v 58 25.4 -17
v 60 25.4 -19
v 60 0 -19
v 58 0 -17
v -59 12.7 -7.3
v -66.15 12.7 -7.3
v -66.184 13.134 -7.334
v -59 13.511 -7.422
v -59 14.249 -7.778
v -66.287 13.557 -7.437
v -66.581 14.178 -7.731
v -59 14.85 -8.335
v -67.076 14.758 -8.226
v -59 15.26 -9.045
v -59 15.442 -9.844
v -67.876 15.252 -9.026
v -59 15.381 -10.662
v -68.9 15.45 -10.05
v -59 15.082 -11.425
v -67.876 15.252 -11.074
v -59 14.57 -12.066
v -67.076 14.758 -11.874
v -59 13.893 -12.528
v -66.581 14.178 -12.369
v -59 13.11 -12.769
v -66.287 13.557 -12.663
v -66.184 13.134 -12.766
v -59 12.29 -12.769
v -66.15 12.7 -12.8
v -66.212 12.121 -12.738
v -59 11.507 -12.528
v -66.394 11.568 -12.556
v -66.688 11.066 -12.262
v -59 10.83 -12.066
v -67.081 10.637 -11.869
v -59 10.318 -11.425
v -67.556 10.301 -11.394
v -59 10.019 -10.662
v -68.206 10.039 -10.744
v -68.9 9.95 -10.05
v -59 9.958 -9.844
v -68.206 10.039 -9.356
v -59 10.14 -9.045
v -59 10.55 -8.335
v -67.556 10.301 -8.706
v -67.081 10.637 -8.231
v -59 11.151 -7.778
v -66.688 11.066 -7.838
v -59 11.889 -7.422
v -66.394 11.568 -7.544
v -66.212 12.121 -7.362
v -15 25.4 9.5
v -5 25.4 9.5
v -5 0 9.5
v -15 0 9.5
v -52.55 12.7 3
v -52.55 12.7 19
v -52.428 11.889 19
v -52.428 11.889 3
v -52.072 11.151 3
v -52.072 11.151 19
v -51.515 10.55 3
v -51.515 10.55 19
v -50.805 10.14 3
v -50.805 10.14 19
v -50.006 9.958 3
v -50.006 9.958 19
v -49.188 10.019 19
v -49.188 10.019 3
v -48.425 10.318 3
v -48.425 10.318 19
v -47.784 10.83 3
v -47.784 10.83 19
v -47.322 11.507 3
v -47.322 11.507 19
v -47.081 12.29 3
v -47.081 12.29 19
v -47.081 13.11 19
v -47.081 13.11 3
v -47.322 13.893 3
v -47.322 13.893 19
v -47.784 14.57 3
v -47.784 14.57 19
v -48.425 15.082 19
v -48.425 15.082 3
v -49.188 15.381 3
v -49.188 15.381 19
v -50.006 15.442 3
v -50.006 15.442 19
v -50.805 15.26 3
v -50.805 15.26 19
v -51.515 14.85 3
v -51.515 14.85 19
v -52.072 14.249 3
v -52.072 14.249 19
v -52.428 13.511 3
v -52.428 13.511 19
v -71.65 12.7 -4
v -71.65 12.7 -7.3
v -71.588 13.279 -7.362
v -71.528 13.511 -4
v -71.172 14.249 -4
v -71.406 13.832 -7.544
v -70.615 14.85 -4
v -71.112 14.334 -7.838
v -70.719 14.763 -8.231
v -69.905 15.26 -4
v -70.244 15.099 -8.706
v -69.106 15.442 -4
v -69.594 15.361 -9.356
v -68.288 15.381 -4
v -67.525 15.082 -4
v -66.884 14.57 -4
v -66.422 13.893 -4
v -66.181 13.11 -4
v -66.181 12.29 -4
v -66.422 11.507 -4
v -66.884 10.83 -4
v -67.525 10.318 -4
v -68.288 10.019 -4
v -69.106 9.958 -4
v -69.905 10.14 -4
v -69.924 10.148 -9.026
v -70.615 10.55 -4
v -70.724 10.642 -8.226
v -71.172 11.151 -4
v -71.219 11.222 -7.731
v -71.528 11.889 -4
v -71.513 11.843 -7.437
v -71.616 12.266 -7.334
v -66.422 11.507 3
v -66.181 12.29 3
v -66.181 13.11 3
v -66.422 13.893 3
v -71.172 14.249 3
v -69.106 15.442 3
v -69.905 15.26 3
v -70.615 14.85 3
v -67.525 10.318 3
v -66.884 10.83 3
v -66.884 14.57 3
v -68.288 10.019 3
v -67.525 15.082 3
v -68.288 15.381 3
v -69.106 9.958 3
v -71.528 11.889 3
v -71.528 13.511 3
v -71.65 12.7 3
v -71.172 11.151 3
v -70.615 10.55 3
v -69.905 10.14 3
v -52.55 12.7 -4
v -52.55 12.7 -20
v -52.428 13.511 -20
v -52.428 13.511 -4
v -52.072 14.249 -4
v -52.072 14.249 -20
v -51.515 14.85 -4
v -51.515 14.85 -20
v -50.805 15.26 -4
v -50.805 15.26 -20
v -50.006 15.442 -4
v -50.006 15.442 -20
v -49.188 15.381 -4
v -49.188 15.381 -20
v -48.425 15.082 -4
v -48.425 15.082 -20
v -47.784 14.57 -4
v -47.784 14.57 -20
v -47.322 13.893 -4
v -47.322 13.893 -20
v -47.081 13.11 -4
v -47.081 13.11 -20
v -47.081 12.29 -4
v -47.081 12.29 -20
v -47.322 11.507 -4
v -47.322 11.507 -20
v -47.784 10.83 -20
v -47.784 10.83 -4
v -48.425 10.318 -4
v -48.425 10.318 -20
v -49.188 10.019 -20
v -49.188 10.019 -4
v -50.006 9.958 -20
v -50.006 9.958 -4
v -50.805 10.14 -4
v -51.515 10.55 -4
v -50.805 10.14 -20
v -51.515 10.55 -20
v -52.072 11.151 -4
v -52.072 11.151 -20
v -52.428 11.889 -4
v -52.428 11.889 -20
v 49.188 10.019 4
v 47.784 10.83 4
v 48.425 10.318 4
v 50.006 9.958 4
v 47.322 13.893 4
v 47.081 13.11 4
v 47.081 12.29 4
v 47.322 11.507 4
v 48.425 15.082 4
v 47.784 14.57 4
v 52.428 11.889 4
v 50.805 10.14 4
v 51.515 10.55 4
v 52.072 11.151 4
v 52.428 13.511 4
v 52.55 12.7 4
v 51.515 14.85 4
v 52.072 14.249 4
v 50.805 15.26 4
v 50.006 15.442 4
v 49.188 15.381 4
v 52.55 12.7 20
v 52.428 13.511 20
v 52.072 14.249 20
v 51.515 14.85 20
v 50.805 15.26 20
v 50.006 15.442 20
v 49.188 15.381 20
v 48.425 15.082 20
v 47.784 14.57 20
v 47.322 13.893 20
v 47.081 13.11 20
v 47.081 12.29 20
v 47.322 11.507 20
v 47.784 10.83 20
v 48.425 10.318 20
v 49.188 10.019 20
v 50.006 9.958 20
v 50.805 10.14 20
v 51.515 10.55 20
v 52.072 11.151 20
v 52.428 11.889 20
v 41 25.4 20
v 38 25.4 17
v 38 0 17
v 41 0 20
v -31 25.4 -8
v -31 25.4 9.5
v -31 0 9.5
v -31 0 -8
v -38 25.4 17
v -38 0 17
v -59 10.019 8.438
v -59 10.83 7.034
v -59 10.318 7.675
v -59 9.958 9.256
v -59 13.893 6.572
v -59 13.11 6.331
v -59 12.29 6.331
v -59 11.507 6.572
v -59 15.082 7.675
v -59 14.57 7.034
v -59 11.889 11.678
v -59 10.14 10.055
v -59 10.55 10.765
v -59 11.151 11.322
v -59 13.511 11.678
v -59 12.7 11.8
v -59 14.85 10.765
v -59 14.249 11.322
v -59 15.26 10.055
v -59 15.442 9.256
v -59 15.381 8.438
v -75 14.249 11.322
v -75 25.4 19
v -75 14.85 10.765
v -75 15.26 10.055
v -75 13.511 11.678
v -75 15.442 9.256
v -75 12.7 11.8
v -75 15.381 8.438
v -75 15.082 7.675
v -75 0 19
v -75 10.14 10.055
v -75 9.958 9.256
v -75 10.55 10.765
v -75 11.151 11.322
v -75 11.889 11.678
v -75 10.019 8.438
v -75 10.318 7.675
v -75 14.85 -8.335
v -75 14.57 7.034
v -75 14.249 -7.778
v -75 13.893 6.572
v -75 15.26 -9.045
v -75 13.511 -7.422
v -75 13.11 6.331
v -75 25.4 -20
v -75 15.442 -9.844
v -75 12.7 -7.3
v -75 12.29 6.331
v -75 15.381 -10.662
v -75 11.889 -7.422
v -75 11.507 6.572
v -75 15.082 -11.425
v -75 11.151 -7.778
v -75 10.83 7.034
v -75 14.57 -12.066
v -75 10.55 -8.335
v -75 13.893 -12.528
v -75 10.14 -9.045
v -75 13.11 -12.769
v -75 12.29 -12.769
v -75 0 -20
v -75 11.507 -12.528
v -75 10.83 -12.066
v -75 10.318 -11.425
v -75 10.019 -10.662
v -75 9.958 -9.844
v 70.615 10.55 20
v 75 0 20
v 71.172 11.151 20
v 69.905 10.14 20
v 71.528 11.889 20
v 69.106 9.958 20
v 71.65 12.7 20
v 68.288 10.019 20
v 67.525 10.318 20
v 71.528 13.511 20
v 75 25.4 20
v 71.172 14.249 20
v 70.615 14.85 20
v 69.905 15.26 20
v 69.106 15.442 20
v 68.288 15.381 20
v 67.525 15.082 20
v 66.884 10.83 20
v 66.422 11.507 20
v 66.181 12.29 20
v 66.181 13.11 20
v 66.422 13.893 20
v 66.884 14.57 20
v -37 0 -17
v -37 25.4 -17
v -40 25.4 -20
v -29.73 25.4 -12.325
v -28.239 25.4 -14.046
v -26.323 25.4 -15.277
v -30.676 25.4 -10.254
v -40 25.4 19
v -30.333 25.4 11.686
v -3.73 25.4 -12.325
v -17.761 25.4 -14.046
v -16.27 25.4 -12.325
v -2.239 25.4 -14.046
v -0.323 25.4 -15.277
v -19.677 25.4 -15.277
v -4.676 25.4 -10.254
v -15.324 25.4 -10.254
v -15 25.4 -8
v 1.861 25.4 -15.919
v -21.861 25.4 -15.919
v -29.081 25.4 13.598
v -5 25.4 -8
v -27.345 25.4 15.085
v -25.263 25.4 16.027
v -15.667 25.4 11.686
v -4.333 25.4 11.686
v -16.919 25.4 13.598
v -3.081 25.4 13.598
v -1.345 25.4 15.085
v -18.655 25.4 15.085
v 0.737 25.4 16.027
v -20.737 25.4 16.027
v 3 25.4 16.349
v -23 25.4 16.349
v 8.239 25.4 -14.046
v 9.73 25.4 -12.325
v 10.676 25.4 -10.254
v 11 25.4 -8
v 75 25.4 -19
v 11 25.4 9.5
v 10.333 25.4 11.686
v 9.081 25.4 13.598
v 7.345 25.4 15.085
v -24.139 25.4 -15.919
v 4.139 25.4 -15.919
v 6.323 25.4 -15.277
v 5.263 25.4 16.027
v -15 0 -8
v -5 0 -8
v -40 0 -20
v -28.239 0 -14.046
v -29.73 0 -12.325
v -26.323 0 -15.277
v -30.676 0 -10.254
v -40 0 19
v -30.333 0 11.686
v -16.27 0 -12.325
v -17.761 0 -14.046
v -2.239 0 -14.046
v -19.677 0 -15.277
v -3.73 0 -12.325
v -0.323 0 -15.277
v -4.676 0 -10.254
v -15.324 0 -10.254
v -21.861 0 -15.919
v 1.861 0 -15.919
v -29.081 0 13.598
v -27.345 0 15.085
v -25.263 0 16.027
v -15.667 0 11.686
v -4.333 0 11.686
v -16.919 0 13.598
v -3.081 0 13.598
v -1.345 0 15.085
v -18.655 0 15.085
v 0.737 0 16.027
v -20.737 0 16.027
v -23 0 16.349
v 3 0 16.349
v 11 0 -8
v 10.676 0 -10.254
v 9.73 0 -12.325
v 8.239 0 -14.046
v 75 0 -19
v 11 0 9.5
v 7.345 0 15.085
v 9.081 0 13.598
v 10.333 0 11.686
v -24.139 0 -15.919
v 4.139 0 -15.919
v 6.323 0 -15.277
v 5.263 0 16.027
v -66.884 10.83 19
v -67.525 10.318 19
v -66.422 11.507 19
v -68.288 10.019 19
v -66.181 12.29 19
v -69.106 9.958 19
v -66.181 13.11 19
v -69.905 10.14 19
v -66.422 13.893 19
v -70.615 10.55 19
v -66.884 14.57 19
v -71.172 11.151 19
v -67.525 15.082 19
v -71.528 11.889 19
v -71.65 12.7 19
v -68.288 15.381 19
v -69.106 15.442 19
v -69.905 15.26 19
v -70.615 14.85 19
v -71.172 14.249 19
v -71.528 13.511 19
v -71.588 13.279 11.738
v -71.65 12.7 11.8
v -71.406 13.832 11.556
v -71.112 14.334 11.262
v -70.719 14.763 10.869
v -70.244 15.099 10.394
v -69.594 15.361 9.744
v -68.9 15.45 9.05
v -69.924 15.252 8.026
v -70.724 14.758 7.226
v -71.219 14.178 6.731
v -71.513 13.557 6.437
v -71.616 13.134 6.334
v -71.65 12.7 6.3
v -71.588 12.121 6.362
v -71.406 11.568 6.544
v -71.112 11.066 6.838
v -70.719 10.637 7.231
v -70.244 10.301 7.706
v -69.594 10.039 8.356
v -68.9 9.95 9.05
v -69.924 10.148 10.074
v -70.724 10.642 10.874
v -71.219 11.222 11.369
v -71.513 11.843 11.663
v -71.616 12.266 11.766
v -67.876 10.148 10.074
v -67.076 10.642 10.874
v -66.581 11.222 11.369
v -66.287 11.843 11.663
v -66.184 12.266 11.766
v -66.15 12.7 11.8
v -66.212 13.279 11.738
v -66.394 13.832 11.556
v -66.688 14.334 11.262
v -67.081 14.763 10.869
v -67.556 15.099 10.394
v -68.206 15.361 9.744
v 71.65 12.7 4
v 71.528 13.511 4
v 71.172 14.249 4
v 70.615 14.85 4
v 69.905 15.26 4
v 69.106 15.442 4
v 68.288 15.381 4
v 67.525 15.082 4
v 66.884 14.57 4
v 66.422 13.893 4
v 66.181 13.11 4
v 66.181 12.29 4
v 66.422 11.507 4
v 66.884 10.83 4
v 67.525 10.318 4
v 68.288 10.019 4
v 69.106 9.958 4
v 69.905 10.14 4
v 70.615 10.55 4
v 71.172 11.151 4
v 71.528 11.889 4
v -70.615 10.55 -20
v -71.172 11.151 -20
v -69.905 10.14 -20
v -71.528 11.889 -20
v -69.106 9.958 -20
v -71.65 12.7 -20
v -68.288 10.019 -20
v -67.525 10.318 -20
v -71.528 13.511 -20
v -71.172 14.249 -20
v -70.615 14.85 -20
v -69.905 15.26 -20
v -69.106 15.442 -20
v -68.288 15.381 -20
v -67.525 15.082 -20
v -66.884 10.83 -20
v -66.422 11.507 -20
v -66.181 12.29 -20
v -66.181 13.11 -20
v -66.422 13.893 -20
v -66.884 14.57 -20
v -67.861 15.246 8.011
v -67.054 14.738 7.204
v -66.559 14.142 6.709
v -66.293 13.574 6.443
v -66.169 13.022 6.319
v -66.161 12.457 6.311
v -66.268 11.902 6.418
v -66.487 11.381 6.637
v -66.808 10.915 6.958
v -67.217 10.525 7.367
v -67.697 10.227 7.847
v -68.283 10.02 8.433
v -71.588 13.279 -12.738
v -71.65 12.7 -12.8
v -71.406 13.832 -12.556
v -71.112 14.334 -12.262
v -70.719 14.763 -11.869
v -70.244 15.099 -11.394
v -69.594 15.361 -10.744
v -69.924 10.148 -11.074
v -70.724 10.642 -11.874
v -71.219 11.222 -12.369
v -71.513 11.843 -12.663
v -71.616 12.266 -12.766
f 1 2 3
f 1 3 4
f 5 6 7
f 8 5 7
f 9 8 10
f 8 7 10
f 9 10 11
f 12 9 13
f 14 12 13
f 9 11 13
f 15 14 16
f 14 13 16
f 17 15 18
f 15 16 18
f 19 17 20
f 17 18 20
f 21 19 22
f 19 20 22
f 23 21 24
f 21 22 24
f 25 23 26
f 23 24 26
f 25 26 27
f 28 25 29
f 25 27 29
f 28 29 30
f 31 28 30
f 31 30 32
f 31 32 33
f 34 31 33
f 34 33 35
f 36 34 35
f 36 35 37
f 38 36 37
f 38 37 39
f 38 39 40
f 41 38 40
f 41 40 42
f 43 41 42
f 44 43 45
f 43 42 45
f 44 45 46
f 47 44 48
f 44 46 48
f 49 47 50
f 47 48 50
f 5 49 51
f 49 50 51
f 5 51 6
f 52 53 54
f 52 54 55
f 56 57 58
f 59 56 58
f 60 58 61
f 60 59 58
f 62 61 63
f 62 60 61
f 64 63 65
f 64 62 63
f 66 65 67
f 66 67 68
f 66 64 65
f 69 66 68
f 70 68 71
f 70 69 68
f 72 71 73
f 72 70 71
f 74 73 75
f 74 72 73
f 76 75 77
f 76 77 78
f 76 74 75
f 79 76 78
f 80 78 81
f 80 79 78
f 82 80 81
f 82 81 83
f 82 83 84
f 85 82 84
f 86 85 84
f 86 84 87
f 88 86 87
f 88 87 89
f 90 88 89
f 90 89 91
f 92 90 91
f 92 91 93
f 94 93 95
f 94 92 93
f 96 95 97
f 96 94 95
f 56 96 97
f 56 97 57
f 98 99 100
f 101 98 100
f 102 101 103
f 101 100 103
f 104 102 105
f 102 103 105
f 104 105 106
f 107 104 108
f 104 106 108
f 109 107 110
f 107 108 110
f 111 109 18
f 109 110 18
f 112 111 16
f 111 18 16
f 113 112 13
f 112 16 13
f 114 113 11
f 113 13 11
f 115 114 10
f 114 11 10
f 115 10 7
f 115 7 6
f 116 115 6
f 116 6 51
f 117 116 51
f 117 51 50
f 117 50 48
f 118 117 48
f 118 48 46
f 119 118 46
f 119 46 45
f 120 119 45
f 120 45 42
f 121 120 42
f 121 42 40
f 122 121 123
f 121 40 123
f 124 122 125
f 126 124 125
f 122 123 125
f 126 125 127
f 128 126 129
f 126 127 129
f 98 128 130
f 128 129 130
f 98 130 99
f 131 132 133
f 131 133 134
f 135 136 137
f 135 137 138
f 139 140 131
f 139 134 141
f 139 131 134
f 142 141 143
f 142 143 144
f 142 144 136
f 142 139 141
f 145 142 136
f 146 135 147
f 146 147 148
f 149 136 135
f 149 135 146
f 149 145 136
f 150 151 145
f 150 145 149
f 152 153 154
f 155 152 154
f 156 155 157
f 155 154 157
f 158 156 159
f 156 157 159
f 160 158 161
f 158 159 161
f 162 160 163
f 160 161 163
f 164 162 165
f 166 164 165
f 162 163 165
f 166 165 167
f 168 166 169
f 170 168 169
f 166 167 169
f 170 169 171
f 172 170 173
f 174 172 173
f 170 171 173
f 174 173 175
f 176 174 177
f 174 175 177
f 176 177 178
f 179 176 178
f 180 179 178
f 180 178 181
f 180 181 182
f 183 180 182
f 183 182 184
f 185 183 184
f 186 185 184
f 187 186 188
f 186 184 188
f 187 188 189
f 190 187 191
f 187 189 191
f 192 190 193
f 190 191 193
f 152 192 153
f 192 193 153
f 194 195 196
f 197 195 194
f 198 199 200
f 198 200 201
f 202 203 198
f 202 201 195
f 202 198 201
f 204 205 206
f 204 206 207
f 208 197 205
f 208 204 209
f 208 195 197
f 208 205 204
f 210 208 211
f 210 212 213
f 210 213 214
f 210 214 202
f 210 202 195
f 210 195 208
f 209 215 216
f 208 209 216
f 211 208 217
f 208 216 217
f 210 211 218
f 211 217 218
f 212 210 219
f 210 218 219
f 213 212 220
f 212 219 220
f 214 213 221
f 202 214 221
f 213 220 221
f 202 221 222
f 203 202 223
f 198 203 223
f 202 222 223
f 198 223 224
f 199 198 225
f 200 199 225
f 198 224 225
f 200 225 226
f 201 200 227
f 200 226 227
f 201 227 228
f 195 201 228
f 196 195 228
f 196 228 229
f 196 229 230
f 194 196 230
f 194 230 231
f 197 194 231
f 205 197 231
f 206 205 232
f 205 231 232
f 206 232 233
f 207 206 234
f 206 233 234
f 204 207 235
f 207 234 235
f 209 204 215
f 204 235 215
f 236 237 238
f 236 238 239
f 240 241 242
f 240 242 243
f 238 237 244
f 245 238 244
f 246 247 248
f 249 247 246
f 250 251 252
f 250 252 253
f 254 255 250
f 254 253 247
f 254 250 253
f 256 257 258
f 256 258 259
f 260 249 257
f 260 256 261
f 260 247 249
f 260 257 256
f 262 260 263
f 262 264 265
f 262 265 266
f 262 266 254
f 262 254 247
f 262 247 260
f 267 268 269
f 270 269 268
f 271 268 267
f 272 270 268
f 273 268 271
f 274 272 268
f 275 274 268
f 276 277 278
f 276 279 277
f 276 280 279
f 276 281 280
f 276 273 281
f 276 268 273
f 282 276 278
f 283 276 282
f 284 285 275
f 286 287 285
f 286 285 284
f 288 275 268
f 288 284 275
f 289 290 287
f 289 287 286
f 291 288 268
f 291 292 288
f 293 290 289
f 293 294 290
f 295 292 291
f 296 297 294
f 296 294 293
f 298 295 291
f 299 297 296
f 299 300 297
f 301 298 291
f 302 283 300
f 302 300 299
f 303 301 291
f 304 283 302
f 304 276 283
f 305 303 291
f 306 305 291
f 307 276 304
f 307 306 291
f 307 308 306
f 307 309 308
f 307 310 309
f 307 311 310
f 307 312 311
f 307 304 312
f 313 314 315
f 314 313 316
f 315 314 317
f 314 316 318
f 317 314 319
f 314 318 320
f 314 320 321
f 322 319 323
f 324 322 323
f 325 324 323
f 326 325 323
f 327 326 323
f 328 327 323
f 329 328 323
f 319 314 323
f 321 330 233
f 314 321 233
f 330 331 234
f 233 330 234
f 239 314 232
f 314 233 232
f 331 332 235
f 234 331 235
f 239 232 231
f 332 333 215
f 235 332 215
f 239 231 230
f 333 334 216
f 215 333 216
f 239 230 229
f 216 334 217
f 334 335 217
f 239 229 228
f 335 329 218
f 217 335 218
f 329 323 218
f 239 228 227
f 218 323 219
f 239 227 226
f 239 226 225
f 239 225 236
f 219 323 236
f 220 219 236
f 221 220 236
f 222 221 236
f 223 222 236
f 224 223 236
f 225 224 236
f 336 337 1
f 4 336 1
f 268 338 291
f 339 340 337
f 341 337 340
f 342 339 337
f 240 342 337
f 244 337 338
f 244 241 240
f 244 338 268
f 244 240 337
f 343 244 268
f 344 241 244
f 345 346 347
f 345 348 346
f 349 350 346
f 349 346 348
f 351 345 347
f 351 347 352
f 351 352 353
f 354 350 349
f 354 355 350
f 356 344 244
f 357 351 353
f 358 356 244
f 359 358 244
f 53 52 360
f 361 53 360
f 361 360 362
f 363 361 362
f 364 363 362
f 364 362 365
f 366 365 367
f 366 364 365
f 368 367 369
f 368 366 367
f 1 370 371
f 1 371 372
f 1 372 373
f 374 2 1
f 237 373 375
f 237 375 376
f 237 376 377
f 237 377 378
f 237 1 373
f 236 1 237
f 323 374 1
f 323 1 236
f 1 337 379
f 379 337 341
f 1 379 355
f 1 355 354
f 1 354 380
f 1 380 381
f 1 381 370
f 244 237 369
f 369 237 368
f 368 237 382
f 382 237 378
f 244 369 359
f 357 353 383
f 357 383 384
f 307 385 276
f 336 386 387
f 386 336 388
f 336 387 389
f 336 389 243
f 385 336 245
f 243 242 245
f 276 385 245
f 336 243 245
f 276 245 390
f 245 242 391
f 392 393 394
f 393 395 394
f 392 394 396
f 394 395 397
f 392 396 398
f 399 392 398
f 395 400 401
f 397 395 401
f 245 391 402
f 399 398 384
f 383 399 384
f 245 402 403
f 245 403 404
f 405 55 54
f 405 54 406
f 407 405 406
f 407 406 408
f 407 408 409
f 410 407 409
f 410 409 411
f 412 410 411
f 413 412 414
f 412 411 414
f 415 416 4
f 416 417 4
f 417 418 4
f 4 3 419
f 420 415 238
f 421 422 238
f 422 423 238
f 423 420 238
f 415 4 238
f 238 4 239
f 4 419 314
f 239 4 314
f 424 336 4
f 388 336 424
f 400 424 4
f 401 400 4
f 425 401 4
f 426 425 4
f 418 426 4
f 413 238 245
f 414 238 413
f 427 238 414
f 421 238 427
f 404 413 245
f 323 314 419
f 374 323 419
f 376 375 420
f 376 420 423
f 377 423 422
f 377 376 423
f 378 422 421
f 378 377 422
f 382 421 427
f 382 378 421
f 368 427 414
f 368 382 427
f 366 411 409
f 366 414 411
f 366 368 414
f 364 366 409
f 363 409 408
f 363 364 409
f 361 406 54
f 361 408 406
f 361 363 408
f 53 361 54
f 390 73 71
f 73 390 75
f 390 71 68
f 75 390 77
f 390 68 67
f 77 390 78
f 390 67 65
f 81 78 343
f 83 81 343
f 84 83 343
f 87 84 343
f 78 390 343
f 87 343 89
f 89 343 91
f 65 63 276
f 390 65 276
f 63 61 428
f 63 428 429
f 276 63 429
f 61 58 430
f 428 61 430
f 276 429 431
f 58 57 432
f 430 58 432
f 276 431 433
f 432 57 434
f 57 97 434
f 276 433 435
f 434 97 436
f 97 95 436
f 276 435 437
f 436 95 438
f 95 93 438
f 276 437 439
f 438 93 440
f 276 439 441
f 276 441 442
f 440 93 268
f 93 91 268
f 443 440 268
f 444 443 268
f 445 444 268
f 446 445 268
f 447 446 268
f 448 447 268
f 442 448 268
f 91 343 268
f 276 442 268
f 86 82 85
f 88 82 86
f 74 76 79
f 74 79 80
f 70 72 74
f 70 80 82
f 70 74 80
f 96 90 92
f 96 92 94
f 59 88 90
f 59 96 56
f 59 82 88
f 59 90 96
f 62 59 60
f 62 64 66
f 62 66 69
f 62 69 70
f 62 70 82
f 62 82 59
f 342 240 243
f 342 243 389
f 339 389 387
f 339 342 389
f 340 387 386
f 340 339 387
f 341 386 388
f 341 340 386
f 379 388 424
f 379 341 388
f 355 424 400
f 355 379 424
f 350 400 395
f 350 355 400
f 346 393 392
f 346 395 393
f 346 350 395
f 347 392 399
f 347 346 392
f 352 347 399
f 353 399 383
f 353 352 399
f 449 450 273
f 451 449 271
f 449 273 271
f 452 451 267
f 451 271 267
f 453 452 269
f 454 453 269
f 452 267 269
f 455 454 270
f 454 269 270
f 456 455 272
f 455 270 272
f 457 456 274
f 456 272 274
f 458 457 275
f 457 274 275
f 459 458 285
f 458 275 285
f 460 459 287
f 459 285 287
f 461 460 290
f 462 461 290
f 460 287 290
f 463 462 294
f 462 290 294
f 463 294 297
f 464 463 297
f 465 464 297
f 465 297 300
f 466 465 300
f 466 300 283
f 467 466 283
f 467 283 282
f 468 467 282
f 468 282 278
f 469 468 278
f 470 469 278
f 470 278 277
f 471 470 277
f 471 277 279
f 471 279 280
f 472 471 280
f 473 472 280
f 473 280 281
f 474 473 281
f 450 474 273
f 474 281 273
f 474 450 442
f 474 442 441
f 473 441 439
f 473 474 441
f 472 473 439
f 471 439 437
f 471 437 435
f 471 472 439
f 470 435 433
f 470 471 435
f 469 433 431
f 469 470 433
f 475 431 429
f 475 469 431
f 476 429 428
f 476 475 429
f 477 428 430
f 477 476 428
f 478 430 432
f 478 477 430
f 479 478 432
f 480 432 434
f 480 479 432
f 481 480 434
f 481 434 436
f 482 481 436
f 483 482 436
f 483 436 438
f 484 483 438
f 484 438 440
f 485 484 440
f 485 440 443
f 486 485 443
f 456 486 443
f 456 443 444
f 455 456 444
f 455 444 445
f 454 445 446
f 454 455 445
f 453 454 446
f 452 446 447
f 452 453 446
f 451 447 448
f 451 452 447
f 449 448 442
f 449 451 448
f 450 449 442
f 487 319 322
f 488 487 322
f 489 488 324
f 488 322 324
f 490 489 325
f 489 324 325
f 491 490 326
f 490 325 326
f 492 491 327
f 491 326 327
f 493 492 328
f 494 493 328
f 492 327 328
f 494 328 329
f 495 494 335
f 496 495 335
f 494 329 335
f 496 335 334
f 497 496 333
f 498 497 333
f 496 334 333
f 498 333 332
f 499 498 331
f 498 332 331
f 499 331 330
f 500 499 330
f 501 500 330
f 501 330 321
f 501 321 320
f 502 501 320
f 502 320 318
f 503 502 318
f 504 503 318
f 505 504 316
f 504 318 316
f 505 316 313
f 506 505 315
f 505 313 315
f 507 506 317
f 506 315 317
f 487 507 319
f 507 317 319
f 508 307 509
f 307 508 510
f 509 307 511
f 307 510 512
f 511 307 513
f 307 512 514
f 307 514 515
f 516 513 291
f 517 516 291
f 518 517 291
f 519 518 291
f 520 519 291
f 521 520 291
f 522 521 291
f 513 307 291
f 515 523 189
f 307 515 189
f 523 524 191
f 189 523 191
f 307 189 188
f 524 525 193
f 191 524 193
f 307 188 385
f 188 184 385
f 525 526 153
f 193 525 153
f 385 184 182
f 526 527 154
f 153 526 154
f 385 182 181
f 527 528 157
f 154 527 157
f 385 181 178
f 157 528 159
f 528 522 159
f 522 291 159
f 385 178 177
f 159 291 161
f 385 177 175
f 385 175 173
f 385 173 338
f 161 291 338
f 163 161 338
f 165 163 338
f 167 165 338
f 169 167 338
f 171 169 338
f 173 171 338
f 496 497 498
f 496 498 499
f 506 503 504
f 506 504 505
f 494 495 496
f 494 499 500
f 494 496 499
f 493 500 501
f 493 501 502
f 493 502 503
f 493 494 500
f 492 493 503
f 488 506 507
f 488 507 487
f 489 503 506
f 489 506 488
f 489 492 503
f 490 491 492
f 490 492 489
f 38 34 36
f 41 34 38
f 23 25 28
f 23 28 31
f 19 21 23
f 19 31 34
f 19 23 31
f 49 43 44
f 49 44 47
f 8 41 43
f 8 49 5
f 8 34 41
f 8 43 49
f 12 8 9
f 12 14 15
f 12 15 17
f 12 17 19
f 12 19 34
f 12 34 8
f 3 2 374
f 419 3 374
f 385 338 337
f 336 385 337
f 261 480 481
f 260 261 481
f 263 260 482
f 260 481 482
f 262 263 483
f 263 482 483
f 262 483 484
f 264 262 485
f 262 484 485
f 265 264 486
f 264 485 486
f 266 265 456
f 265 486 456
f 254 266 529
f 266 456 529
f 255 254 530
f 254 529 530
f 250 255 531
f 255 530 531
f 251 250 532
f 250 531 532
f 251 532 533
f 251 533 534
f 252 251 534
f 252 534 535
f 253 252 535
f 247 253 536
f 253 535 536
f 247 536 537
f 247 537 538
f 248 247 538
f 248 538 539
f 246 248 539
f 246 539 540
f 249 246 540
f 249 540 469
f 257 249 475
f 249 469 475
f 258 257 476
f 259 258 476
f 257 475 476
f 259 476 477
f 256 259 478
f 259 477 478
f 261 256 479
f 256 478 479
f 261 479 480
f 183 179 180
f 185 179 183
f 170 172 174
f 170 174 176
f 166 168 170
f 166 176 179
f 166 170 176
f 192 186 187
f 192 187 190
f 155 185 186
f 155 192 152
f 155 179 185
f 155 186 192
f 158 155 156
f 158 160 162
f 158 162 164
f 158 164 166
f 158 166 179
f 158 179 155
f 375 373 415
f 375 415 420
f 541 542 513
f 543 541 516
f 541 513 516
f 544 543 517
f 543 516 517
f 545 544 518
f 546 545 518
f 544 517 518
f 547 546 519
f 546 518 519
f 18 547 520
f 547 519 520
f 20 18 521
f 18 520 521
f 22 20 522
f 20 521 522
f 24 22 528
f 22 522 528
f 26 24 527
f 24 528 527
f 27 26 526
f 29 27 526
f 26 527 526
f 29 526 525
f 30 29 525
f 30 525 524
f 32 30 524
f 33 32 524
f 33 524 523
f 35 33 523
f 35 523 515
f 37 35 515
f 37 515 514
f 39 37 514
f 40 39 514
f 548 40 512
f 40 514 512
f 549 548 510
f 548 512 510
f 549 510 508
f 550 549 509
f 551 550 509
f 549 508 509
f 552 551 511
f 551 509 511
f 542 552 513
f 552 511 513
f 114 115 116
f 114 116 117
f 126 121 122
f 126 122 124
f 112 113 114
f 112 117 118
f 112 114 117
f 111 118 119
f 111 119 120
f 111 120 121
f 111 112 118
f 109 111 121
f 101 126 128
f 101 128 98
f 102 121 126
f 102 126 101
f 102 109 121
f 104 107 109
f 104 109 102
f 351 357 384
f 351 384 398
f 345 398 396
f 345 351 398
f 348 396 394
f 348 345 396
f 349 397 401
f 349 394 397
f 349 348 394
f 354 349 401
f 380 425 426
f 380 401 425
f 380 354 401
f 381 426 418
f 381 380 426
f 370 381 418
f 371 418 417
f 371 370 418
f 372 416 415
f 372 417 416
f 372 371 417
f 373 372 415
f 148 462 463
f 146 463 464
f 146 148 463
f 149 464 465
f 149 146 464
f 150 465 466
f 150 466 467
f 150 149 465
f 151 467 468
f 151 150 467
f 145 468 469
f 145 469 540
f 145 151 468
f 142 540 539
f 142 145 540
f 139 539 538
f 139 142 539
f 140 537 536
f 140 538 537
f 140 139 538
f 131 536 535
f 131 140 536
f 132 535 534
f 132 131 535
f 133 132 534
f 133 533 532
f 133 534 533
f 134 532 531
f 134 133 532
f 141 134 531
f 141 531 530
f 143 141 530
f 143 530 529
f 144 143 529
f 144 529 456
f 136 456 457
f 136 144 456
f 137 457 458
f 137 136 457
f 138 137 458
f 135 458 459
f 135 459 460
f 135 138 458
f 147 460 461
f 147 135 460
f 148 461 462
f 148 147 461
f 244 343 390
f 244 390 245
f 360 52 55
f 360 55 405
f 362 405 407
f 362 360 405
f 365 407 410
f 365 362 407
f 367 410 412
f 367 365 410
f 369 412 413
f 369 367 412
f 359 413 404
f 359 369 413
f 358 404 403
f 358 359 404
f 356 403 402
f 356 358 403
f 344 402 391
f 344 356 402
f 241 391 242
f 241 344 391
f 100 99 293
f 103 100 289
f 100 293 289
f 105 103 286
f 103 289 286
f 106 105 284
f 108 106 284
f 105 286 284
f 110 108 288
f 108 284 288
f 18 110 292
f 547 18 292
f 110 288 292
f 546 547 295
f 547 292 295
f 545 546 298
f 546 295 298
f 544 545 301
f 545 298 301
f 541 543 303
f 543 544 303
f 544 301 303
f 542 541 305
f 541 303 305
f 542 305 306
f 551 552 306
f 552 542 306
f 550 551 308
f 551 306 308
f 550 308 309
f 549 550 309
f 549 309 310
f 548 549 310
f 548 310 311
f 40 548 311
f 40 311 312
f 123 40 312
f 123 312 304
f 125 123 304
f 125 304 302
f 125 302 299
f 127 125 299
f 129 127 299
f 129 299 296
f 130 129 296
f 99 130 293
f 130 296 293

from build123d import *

# Parameters (mm, degrees)
CROQUIS1_W              = 150
CROQUIS1_H              = 40
SALIENTE_EXTRUIR1_DEPTH = 25.4
CORTAR_EXTRUIR1_DEPTH   = 82.671047502
CHAFL_N1_SIZE           = 5
CHAFL_N2_SIZE           = 3
CORTAR_EXTRUIR2_DEPTH   = 82.671047502
CROQUIS5_R              = 2.75
CORTAR_EXTRUIR3_DEPTH   = 16
CROQUIS6_R              = 2.75
CORTAR_EXTRUIR4_DEPTH   = 16
CORTAR_EXTRUIR8_START   = -16
CROQUIS7_R              = 2.75
CORTAR_EXTRUIR8_DEPTH   = 16
CROQUIS8_R              = 2.75
CORTAR_EXTRUIR9_DEPTH   = 16


with BuildPart() as part:
    # Croquis1 → Saliente-Extruir1 (new body)
    with BuildSketch(Plane(origin=(0, 0, 0), x_dir=(1, 0, 0), z_dir=(0, 1, 0))):
        Rectangle(CROQUIS1_W, CROQUIS1_H)
    extrude(amount=SALIENTE_EXTRUIR1_DEPTH)

    # Croquis2 → Cortar-Extruir1 (cut, through all)
    with BuildSketch(Plane(origin=(0, 25.4, 0), x_dir=(1, 0, 0), z_dir=(0, 1, 0))):
        Polygon((-42, 20), (-42, 17), (61, 17), (61, 19), (75, 19), (75, 20), (60, 20), align=None)
        Polygon((43, -20), (43, -17), (-41, -17), (-41, -19), (-75, -19), (-75, -20), align=None)
    extrude(amount=-CORTAR_EXTRUIR1_DEPTH, mode=Mode.SUBTRACT)

    # Chaflán1
    # the kernel refuses this chamfer: 5 mm, written as the material it adds along each edge
    with BuildSketch(Plane(origin=(43, 25.4, 17), x_dir=(-0.9996219169112968, 0, -0.027495876610586317), z_dir=(0, -1, 0))) as chafl_n1_piece_1_section:
        Polygon((CHAFL_N1_SIZE * 0.999621916911, -CHAFL_N1_SIZE * 0.0274958766106), (-CHAFL_N1_SIZE * 0.0274958766106, -CHAFL_N1_SIZE * 0.999621916911), (0, 0), align=None)
    chafl_n1_piece_1 = extrude(amount=25.4, mode=Mode.PRIVATE)
    chafl_n1_piece_1 = split(chafl_n1_piece_1, bisect_by=Plane(origin=(41.124952702, 12.7, 20), z_dir=(0, 0, -1)), keep=Keep.TOP, mode=Mode.PRIVATE)
    add(chafl_n1_piece_1)
    with BuildSketch(Plane(origin=(-42, 25.4, -17), x_dir=(-0.027495876610586317, 0, -0.9996219169112968), z_dir=(0, -1, 0))) as chafl_n1_piece_2_section:
        Polygon((CHAFL_N1_SIZE * 0.999621916911, CHAFL_N1_SIZE * 0.0274958766106), (-CHAFL_N1_SIZE * 0.0274958766106, CHAFL_N1_SIZE * 0.999621916911), (0, 0), align=None)
    chafl_n1_piece_2 = extrude(amount=25.4, mode=Mode.PRIVATE)
    chafl_n1_piece_2 = split(chafl_n1_piece_2, bisect_by=Plane(origin=(-40.124952702, 12.7, -20), z_dir=(0, 0, 1)), keep=Keep.TOP, mode=Mode.PRIVATE)
    add(chafl_n1_piece_2)

    # Chaflán2
    # the kernel refuses this chamfer: 3 mm, written as the material it adds along each edge
    with BuildSketch(Plane(origin=(-41, 25.4, 17), x_dir=(-0.027495876610586768, 0, 0.9996219169112968), z_dir=(0, -1, 0))) as chafl_n2_piece_1_section:
        Polygon((CHAFL_N2_SIZE * 0.999621916911, -CHAFL_N2_SIZE * 0.0274958766106), (-CHAFL_N2_SIZE * 0.0274958766106, -CHAFL_N2_SIZE * 0.999621916911), (0, 0), align=None)
    chafl_n2_piece_1 = extrude(amount=25.4, mode=Mode.PRIVATE)
    chafl_n2_piece_1 = split(chafl_n2_piece_1, bisect_by=Plane(origin=(-39.907908995, 12.7, 19), z_dir=(0, 0, -1)), keep=Keep.TOP, mode=Mode.PRIVATE)
    add(chafl_n2_piece_1)
    with BuildSketch(Plane(origin=(61, 25.4, -17), x_dir=(0.027495876610586768, 0, -0.9996219169112968), z_dir=(0, -1, 0))) as chafl_n2_piece_2_section:
        Polygon((CHAFL_N2_SIZE * 0.999621916911, -CHAFL_N2_SIZE * 0.0274958766106), (-CHAFL_N2_SIZE * 0.0274958766106, -CHAFL_N2_SIZE * 0.999621916911), (0, 0), align=None)
    chafl_n2_piece_2 = extrude(amount=25.4, mode=Mode.PRIVATE)
    chafl_n2_piece_2 = split(chafl_n2_piece_2, bisect_by=Plane(origin=(59.907908995, 12.7, -19), z_dir=(0, 0, 1)), keep=Keep.TOP, mode=Mode.PRIVATE)
    add(chafl_n2_piece_2)

    # Croquis3 → Cortar-Extruir2 (cut, through all)
    with BuildSketch(Plane(origin=(0, 25.4, 0), x_dir=(1, 0, 0), z_dir=(0, 1, 0))):
        with BuildLine():
            Line((-15, 8), (-5, 8))
            ThreePointArc((-5, 8), (3, 16), (11, 8))
            Line((11, 8), (11, -9.5))
            ThreePointArc((11, -9.5), (3, -16.34938703), (-5, -9.5))
            Line((-5, -9.5), (-15, -9.5))
            ThreePointArc((-15, -9.5), (-23, -16.349387053), (-31, -9.5))
            Line((-31, -9.5), (-31, 8))
            ThreePointArc((-31, 8), (-23, 16), (-15, 8))
        make_face()
    extrude(amount=-CORTAR_EXTRUIR2_DEPTH, mode=Mode.SUBTRACT)

    # Croquis5 → Cortar-Extruir3 (cut)
    with BuildSketch(Plane(origin=(0, 0, -20), x_dir=(-1, 0, 0), z_dir=(0, 0, -1))):
        with Locations((68.9, 12.7)):
            Circle(CROQUIS5_R)
        with Locations((49.8, 12.7)):
            Circle(CROQUIS5_R)
    extrude(amount=-CORTAR_EXTRUIR3_DEPTH, mode=Mode.SUBTRACT)

    # Croquis6 → Cortar-Extruir4 (cut)
    with BuildSketch(Plane.ZY.offset(75)):
        with Locations((9.05, 12.7)):
            Circle(CROQUIS6_R)
        with Locations((-10.05, 12.7)):
            Circle(CROQUIS6_R)
    extrude(amount=-CORTAR_EXTRUIR4_DEPTH, mode=Mode.SUBTRACT)

    # Croquis7 → Cortar-Extruir8 (cut)
    with BuildSketch(Plane.XY.offset(19).offset(CORTAR_EXTRUIR8_START)):
        with Locations(Location((-68.9, 12.7, 0), (0, 0, 180))):
            Circle(CROQUIS7_R)
        with Locations(Location((-49.8, 12.7, 0), (0, 0, 180))):
            Circle(CROQUIS7_R)
    extrude(amount=CORTAR_EXTRUIR8_DEPTH, mode=Mode.SUBTRACT)

    # Croquis8 → Cortar-Extruir9 (cut)
    with BuildSketch(Plane.XY.offset(20)):
        with Locations((49.8, 12.7)):
            Circle(CROQUIS8_R)
        with Locations((68.9, 12.7)):
            Circle(CROQUIS8_R)
    extrude(amount=-CORTAR_EXTRUIR9_DEPTH, mode=Mode.SUBTRACT)


solid = part.part
